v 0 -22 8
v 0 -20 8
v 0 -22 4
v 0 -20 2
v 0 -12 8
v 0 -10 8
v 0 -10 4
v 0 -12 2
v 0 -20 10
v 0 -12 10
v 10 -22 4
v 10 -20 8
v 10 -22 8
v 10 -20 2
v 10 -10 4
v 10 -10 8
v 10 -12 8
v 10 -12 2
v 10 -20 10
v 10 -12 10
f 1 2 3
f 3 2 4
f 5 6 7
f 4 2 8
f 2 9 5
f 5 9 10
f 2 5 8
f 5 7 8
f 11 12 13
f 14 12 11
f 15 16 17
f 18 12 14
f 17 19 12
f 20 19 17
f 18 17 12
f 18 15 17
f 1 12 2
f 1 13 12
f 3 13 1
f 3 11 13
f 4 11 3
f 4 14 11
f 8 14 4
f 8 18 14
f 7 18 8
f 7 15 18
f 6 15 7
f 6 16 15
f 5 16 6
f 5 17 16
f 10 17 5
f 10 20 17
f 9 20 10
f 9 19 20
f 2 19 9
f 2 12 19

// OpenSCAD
   translate([0,-20,10]) {
       rotate([90,180,90]) {
           linear_extrude(10) {
               polygon(
                   points = [
                      //x,y
                       /*
                                  O  .
                       */
                       [-0, 0],
                       /*
                                O__X  .
                       */
                       [-8, 0],
                       /*
                              O
                               \
                                X__X  .
                       */
                       [-8, 2],
                       /*
                              X_______._____O
                               \         
                                X__X  .
                       */
                       [-10, 2],
                       /*
                              X_______._______X
                               \             /
                                X__X  .     O
                       */
                       [-10, 6],
                       /*
                              X_______._______X
                               \             /
                                X__X  .  O__X
                       */
                       [-8, 8],
                       /*
                           X__________.__________X
                            \                   /
                             \              O  /
                              \            /  /
                               \          /  /
                                X__X  .  X__X
                       */
                       [0, 8],
                       /*
                           X__________.__________X
                            \                   /
                             \   O__________X  /
                              \            /  /
                               \          /  /
                                X__X  .  X__X
                       */
                       [2, 6],
                       
                        [2, 2],
                        [0, 2],
                       
                       
                       
                                   ]
                               );
                           }
       }
   }
